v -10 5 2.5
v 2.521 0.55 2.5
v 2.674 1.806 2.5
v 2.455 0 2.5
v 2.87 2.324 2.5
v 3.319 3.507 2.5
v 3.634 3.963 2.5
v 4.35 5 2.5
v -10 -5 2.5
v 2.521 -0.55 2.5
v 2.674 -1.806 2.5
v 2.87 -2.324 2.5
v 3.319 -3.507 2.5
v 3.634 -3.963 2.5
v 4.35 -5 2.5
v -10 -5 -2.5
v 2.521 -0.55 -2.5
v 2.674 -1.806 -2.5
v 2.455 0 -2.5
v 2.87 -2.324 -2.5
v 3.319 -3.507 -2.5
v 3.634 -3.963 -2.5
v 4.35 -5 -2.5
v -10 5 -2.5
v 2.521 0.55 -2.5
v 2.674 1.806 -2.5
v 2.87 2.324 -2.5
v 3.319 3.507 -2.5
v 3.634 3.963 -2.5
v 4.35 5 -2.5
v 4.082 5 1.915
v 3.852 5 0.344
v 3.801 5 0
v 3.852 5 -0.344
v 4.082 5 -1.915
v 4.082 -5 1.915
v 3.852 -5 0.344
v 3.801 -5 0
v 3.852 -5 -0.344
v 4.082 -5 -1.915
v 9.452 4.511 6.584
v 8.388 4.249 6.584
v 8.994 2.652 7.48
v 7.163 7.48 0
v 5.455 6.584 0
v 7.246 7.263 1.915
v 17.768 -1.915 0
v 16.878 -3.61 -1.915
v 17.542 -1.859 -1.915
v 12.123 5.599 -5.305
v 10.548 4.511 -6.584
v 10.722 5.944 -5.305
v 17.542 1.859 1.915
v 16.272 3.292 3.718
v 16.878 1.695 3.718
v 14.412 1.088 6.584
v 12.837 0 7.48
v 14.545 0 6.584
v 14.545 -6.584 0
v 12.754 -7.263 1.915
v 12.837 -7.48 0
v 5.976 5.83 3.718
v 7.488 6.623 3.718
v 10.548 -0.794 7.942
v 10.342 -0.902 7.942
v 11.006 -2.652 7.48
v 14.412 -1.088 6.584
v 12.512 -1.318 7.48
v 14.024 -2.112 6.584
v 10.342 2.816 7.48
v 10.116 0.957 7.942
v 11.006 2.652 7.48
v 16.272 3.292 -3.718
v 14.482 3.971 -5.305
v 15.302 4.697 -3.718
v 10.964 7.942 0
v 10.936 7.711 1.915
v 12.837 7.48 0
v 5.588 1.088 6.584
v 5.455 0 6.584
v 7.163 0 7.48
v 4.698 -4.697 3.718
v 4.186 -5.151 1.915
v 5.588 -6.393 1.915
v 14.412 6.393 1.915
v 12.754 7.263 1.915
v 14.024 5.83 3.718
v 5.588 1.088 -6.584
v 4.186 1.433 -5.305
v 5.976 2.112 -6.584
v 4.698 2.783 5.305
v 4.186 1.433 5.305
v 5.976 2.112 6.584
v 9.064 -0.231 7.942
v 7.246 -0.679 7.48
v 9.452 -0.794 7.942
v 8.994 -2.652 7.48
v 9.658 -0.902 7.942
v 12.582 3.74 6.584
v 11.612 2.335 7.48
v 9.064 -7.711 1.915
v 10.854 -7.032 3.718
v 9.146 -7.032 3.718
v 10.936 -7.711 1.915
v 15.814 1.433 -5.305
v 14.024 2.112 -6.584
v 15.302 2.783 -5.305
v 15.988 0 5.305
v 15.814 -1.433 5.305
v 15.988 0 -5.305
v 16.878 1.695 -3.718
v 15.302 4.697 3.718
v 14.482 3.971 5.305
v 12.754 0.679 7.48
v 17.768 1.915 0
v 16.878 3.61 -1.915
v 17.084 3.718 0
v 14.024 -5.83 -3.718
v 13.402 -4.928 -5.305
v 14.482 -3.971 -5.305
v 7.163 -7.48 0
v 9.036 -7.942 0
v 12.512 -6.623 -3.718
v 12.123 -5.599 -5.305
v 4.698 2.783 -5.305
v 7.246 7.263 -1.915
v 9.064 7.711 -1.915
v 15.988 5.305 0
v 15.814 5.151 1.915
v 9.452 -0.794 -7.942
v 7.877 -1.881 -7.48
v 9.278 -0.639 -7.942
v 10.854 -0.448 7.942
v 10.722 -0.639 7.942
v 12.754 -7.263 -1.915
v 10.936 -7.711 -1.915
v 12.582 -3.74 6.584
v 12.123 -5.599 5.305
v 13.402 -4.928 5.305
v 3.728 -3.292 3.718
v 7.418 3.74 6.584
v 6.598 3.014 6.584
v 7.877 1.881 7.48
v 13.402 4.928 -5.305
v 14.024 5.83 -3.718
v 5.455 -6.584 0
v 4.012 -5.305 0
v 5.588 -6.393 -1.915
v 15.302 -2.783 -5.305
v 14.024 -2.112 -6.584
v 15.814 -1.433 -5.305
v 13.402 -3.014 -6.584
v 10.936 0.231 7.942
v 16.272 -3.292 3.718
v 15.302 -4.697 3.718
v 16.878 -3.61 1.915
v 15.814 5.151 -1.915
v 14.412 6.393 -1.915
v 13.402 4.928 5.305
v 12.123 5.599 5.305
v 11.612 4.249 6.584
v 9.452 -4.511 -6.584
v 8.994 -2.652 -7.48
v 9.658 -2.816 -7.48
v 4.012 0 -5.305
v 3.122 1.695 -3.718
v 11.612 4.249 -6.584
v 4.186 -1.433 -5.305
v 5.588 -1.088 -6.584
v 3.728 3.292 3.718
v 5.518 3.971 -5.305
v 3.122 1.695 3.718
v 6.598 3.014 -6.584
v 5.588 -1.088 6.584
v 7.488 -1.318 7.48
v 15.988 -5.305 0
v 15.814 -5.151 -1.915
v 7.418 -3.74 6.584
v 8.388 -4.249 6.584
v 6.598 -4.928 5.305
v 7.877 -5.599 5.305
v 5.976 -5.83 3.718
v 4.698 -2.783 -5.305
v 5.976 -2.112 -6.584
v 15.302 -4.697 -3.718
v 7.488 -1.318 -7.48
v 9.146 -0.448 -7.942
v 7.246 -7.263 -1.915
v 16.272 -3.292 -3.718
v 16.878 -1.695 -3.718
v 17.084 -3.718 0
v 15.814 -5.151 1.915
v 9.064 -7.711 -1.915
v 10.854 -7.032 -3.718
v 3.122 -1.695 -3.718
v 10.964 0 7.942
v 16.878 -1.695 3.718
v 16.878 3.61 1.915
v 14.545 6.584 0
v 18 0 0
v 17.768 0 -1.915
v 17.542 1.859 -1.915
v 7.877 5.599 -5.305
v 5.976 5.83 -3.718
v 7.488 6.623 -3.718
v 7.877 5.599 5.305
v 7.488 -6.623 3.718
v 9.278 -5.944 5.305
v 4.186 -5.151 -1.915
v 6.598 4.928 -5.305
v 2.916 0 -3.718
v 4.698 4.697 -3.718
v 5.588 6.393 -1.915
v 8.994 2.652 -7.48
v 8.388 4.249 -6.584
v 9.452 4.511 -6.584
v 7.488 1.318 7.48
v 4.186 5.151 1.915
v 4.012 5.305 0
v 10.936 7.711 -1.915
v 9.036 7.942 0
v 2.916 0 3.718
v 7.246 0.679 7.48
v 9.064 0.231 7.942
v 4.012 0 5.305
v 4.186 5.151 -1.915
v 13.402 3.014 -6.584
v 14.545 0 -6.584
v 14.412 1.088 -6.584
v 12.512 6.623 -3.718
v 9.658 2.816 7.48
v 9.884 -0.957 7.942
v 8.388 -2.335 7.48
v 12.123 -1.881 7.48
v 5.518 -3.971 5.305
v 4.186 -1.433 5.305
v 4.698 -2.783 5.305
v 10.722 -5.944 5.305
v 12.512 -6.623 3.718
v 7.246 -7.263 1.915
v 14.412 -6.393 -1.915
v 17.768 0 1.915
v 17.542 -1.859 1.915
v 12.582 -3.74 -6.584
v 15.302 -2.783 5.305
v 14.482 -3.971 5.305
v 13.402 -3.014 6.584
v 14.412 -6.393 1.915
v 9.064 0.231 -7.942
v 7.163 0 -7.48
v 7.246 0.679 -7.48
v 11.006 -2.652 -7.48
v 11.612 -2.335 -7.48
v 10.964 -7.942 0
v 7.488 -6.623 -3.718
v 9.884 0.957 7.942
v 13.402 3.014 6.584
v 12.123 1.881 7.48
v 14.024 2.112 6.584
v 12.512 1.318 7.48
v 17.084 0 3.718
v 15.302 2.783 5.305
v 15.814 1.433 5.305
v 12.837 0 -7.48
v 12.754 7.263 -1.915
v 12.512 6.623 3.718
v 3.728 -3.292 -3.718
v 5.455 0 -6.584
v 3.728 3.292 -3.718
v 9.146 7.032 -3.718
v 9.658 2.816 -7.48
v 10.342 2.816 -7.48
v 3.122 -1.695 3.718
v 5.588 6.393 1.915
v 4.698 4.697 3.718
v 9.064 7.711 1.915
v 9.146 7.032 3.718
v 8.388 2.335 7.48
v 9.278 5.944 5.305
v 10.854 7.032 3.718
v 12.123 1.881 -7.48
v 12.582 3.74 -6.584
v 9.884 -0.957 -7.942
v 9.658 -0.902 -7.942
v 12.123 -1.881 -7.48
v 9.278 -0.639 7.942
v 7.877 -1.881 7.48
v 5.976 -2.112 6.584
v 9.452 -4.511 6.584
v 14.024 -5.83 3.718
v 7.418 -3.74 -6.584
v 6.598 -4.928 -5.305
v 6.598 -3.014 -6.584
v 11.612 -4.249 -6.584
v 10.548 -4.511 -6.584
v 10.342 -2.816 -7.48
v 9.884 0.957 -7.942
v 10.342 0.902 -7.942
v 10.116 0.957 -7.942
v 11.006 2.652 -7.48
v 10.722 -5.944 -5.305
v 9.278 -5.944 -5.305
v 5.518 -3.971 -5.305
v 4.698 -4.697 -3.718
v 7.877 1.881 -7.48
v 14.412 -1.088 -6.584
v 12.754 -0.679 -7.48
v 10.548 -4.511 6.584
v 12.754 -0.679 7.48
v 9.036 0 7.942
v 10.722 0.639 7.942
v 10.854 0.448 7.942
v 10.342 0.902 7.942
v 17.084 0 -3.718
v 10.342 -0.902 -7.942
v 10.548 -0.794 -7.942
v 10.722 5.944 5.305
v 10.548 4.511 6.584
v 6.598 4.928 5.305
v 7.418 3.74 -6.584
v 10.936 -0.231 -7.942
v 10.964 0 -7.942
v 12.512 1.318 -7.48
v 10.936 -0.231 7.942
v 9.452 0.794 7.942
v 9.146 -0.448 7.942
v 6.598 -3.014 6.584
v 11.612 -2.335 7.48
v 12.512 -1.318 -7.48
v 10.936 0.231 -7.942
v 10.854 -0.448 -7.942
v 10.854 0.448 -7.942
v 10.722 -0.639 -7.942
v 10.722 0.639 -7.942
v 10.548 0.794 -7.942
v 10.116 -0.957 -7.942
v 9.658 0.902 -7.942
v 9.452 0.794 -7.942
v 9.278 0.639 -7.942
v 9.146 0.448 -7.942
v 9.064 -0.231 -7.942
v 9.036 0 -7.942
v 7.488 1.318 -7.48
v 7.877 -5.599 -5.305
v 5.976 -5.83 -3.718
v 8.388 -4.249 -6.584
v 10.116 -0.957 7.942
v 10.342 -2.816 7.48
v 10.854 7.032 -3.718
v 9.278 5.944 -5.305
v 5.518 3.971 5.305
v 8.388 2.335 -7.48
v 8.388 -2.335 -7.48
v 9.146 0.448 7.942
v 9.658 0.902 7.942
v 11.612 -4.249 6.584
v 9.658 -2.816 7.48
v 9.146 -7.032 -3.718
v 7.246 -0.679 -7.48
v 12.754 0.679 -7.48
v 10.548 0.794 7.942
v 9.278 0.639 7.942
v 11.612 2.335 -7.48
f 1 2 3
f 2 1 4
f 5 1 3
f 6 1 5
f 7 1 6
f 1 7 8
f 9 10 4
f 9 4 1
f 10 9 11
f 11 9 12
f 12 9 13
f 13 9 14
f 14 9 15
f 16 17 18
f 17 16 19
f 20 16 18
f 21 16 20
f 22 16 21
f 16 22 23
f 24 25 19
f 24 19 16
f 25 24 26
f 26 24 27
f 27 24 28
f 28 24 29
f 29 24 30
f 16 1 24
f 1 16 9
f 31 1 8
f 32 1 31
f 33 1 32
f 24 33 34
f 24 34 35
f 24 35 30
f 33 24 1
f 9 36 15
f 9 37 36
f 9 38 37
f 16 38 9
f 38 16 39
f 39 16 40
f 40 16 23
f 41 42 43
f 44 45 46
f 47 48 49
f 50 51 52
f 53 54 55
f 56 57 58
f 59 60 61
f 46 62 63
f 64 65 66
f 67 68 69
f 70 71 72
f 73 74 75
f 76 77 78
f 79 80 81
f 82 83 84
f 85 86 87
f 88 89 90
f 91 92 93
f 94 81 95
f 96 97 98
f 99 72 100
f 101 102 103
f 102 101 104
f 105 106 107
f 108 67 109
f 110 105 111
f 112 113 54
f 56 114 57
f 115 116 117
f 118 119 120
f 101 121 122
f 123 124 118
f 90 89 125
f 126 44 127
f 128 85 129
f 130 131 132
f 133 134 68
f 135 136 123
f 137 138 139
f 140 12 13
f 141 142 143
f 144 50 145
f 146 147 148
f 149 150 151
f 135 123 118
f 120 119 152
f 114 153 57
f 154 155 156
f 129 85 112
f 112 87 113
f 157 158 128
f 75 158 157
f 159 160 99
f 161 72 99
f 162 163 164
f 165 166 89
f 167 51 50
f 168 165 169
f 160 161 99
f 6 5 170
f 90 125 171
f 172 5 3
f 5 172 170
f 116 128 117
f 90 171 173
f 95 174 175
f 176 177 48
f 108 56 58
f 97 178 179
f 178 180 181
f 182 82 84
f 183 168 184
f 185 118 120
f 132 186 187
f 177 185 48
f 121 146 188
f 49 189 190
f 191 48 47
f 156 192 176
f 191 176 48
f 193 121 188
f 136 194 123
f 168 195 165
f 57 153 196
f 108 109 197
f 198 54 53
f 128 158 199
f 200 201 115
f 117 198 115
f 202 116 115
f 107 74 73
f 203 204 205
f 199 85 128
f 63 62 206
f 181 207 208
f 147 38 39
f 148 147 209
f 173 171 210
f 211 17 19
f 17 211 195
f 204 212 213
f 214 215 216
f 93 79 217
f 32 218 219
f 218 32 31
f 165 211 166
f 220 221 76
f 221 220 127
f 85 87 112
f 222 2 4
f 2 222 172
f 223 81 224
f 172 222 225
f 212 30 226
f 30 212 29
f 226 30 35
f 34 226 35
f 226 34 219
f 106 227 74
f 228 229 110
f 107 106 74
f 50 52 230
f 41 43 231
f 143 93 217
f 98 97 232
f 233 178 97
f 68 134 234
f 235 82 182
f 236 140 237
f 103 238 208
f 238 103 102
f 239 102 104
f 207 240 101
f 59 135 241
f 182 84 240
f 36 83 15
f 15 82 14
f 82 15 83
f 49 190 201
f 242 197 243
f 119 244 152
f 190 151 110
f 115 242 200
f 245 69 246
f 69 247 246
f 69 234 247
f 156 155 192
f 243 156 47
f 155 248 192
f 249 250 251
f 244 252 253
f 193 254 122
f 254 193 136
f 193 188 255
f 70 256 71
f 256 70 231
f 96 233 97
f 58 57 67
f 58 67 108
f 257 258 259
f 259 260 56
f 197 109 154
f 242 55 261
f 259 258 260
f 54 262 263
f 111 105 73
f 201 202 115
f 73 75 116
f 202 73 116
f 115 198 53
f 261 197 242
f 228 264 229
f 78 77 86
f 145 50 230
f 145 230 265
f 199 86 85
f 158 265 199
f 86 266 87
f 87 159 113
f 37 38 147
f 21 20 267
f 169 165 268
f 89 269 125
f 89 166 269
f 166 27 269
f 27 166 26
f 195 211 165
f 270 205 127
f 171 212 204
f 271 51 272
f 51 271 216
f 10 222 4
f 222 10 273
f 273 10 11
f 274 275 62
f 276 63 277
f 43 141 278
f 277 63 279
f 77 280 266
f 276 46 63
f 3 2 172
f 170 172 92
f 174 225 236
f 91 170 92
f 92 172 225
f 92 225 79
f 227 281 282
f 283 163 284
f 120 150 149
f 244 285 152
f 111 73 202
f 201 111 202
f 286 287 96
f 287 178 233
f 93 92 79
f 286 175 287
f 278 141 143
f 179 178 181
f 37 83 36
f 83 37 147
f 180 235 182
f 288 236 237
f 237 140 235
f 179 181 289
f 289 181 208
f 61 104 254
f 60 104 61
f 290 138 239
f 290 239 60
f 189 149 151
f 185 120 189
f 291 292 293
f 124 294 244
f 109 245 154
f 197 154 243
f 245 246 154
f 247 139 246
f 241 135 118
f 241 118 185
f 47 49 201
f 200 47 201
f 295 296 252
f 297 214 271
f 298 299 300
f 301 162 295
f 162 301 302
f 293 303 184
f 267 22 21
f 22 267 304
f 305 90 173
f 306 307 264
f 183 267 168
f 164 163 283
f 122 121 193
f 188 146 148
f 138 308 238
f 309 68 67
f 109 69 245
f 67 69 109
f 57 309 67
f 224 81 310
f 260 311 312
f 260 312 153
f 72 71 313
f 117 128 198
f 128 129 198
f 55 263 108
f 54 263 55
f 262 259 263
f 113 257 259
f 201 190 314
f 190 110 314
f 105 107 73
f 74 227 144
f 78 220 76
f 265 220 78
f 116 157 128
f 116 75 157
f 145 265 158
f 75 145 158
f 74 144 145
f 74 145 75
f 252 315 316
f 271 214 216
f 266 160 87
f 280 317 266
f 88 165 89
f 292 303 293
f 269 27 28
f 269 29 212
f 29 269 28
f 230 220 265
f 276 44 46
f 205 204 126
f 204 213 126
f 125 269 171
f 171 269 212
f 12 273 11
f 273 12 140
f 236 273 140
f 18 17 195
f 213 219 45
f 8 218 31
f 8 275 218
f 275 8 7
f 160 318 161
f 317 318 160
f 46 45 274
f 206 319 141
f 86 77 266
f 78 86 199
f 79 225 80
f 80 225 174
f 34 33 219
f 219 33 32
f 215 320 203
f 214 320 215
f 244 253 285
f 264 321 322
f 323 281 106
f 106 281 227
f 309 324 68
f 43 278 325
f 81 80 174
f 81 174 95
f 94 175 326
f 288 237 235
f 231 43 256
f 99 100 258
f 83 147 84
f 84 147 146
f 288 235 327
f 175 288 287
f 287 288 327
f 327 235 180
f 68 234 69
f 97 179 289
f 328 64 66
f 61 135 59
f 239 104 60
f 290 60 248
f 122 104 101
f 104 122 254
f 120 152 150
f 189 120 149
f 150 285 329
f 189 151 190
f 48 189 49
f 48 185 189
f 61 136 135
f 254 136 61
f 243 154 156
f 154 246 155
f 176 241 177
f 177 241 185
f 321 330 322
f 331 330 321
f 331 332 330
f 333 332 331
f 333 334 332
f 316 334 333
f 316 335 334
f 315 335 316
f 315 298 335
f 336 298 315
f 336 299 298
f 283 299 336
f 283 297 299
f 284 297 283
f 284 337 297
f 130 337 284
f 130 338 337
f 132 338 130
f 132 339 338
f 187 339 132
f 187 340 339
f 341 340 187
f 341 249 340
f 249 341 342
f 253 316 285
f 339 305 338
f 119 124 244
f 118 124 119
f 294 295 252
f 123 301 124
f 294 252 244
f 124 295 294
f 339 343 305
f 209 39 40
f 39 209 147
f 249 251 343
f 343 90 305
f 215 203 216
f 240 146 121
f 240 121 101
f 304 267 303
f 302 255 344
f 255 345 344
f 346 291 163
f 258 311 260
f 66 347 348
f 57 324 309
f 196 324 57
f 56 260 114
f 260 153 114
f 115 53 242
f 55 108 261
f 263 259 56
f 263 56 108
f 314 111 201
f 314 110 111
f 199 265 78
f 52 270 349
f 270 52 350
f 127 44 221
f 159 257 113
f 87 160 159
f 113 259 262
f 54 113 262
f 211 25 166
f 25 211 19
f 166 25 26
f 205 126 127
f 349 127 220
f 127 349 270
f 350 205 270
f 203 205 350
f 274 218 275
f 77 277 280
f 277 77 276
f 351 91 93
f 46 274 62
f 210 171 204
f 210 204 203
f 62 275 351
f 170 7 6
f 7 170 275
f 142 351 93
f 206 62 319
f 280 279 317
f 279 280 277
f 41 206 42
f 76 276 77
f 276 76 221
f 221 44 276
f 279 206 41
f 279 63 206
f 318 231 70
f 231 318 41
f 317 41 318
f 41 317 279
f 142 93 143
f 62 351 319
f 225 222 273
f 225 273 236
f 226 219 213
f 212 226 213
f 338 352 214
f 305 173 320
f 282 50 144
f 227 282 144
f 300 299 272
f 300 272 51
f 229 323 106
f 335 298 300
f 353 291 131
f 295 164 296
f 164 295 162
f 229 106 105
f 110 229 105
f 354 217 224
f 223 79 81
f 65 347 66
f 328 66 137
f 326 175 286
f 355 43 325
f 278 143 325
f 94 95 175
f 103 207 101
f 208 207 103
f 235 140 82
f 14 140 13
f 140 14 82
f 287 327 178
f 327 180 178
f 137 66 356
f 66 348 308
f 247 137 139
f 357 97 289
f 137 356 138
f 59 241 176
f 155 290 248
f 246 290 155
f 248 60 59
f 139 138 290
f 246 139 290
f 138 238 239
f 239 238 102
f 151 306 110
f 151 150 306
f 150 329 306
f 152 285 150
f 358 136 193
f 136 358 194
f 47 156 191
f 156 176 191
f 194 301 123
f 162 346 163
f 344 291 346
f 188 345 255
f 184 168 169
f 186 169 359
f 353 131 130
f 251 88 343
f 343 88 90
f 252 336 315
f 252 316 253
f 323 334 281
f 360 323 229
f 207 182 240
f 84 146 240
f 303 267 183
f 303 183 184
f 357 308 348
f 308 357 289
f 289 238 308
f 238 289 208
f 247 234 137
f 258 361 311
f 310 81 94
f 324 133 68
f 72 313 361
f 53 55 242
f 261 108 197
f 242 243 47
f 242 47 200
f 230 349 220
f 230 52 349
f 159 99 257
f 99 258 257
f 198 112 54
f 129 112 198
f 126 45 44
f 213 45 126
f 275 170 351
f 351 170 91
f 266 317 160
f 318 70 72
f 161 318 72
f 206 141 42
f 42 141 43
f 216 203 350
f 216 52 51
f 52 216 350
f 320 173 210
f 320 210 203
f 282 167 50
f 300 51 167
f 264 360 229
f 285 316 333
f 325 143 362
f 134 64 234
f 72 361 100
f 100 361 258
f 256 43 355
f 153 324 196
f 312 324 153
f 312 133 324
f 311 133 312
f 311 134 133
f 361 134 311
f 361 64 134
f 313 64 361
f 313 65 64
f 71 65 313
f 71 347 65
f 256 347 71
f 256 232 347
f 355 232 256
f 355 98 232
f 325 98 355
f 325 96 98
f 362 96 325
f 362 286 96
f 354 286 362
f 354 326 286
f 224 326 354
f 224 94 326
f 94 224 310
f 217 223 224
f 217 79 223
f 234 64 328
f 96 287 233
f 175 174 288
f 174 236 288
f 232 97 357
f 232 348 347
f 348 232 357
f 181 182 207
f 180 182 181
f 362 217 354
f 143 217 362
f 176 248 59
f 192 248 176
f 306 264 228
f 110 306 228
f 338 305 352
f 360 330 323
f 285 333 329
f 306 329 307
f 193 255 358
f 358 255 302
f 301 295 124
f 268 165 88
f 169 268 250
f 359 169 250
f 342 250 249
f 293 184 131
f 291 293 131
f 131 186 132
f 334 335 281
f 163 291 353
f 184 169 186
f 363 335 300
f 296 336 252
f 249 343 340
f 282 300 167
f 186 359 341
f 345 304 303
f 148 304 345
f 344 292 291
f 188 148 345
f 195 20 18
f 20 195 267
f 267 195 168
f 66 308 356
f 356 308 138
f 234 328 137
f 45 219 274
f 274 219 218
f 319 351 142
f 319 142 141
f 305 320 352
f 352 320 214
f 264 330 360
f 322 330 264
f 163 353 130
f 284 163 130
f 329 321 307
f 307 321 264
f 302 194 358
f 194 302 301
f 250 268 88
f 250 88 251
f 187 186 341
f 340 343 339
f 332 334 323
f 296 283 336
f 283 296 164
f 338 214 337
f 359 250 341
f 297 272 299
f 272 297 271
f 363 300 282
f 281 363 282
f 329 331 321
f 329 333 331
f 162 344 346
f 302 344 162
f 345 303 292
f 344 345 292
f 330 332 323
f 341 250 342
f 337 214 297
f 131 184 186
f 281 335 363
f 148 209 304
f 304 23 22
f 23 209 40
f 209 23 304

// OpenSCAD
union() {
  cube(size=[20,10,5], center=true);
  translate([10,0,0]) {
    sphere(r=8);
  }
}
